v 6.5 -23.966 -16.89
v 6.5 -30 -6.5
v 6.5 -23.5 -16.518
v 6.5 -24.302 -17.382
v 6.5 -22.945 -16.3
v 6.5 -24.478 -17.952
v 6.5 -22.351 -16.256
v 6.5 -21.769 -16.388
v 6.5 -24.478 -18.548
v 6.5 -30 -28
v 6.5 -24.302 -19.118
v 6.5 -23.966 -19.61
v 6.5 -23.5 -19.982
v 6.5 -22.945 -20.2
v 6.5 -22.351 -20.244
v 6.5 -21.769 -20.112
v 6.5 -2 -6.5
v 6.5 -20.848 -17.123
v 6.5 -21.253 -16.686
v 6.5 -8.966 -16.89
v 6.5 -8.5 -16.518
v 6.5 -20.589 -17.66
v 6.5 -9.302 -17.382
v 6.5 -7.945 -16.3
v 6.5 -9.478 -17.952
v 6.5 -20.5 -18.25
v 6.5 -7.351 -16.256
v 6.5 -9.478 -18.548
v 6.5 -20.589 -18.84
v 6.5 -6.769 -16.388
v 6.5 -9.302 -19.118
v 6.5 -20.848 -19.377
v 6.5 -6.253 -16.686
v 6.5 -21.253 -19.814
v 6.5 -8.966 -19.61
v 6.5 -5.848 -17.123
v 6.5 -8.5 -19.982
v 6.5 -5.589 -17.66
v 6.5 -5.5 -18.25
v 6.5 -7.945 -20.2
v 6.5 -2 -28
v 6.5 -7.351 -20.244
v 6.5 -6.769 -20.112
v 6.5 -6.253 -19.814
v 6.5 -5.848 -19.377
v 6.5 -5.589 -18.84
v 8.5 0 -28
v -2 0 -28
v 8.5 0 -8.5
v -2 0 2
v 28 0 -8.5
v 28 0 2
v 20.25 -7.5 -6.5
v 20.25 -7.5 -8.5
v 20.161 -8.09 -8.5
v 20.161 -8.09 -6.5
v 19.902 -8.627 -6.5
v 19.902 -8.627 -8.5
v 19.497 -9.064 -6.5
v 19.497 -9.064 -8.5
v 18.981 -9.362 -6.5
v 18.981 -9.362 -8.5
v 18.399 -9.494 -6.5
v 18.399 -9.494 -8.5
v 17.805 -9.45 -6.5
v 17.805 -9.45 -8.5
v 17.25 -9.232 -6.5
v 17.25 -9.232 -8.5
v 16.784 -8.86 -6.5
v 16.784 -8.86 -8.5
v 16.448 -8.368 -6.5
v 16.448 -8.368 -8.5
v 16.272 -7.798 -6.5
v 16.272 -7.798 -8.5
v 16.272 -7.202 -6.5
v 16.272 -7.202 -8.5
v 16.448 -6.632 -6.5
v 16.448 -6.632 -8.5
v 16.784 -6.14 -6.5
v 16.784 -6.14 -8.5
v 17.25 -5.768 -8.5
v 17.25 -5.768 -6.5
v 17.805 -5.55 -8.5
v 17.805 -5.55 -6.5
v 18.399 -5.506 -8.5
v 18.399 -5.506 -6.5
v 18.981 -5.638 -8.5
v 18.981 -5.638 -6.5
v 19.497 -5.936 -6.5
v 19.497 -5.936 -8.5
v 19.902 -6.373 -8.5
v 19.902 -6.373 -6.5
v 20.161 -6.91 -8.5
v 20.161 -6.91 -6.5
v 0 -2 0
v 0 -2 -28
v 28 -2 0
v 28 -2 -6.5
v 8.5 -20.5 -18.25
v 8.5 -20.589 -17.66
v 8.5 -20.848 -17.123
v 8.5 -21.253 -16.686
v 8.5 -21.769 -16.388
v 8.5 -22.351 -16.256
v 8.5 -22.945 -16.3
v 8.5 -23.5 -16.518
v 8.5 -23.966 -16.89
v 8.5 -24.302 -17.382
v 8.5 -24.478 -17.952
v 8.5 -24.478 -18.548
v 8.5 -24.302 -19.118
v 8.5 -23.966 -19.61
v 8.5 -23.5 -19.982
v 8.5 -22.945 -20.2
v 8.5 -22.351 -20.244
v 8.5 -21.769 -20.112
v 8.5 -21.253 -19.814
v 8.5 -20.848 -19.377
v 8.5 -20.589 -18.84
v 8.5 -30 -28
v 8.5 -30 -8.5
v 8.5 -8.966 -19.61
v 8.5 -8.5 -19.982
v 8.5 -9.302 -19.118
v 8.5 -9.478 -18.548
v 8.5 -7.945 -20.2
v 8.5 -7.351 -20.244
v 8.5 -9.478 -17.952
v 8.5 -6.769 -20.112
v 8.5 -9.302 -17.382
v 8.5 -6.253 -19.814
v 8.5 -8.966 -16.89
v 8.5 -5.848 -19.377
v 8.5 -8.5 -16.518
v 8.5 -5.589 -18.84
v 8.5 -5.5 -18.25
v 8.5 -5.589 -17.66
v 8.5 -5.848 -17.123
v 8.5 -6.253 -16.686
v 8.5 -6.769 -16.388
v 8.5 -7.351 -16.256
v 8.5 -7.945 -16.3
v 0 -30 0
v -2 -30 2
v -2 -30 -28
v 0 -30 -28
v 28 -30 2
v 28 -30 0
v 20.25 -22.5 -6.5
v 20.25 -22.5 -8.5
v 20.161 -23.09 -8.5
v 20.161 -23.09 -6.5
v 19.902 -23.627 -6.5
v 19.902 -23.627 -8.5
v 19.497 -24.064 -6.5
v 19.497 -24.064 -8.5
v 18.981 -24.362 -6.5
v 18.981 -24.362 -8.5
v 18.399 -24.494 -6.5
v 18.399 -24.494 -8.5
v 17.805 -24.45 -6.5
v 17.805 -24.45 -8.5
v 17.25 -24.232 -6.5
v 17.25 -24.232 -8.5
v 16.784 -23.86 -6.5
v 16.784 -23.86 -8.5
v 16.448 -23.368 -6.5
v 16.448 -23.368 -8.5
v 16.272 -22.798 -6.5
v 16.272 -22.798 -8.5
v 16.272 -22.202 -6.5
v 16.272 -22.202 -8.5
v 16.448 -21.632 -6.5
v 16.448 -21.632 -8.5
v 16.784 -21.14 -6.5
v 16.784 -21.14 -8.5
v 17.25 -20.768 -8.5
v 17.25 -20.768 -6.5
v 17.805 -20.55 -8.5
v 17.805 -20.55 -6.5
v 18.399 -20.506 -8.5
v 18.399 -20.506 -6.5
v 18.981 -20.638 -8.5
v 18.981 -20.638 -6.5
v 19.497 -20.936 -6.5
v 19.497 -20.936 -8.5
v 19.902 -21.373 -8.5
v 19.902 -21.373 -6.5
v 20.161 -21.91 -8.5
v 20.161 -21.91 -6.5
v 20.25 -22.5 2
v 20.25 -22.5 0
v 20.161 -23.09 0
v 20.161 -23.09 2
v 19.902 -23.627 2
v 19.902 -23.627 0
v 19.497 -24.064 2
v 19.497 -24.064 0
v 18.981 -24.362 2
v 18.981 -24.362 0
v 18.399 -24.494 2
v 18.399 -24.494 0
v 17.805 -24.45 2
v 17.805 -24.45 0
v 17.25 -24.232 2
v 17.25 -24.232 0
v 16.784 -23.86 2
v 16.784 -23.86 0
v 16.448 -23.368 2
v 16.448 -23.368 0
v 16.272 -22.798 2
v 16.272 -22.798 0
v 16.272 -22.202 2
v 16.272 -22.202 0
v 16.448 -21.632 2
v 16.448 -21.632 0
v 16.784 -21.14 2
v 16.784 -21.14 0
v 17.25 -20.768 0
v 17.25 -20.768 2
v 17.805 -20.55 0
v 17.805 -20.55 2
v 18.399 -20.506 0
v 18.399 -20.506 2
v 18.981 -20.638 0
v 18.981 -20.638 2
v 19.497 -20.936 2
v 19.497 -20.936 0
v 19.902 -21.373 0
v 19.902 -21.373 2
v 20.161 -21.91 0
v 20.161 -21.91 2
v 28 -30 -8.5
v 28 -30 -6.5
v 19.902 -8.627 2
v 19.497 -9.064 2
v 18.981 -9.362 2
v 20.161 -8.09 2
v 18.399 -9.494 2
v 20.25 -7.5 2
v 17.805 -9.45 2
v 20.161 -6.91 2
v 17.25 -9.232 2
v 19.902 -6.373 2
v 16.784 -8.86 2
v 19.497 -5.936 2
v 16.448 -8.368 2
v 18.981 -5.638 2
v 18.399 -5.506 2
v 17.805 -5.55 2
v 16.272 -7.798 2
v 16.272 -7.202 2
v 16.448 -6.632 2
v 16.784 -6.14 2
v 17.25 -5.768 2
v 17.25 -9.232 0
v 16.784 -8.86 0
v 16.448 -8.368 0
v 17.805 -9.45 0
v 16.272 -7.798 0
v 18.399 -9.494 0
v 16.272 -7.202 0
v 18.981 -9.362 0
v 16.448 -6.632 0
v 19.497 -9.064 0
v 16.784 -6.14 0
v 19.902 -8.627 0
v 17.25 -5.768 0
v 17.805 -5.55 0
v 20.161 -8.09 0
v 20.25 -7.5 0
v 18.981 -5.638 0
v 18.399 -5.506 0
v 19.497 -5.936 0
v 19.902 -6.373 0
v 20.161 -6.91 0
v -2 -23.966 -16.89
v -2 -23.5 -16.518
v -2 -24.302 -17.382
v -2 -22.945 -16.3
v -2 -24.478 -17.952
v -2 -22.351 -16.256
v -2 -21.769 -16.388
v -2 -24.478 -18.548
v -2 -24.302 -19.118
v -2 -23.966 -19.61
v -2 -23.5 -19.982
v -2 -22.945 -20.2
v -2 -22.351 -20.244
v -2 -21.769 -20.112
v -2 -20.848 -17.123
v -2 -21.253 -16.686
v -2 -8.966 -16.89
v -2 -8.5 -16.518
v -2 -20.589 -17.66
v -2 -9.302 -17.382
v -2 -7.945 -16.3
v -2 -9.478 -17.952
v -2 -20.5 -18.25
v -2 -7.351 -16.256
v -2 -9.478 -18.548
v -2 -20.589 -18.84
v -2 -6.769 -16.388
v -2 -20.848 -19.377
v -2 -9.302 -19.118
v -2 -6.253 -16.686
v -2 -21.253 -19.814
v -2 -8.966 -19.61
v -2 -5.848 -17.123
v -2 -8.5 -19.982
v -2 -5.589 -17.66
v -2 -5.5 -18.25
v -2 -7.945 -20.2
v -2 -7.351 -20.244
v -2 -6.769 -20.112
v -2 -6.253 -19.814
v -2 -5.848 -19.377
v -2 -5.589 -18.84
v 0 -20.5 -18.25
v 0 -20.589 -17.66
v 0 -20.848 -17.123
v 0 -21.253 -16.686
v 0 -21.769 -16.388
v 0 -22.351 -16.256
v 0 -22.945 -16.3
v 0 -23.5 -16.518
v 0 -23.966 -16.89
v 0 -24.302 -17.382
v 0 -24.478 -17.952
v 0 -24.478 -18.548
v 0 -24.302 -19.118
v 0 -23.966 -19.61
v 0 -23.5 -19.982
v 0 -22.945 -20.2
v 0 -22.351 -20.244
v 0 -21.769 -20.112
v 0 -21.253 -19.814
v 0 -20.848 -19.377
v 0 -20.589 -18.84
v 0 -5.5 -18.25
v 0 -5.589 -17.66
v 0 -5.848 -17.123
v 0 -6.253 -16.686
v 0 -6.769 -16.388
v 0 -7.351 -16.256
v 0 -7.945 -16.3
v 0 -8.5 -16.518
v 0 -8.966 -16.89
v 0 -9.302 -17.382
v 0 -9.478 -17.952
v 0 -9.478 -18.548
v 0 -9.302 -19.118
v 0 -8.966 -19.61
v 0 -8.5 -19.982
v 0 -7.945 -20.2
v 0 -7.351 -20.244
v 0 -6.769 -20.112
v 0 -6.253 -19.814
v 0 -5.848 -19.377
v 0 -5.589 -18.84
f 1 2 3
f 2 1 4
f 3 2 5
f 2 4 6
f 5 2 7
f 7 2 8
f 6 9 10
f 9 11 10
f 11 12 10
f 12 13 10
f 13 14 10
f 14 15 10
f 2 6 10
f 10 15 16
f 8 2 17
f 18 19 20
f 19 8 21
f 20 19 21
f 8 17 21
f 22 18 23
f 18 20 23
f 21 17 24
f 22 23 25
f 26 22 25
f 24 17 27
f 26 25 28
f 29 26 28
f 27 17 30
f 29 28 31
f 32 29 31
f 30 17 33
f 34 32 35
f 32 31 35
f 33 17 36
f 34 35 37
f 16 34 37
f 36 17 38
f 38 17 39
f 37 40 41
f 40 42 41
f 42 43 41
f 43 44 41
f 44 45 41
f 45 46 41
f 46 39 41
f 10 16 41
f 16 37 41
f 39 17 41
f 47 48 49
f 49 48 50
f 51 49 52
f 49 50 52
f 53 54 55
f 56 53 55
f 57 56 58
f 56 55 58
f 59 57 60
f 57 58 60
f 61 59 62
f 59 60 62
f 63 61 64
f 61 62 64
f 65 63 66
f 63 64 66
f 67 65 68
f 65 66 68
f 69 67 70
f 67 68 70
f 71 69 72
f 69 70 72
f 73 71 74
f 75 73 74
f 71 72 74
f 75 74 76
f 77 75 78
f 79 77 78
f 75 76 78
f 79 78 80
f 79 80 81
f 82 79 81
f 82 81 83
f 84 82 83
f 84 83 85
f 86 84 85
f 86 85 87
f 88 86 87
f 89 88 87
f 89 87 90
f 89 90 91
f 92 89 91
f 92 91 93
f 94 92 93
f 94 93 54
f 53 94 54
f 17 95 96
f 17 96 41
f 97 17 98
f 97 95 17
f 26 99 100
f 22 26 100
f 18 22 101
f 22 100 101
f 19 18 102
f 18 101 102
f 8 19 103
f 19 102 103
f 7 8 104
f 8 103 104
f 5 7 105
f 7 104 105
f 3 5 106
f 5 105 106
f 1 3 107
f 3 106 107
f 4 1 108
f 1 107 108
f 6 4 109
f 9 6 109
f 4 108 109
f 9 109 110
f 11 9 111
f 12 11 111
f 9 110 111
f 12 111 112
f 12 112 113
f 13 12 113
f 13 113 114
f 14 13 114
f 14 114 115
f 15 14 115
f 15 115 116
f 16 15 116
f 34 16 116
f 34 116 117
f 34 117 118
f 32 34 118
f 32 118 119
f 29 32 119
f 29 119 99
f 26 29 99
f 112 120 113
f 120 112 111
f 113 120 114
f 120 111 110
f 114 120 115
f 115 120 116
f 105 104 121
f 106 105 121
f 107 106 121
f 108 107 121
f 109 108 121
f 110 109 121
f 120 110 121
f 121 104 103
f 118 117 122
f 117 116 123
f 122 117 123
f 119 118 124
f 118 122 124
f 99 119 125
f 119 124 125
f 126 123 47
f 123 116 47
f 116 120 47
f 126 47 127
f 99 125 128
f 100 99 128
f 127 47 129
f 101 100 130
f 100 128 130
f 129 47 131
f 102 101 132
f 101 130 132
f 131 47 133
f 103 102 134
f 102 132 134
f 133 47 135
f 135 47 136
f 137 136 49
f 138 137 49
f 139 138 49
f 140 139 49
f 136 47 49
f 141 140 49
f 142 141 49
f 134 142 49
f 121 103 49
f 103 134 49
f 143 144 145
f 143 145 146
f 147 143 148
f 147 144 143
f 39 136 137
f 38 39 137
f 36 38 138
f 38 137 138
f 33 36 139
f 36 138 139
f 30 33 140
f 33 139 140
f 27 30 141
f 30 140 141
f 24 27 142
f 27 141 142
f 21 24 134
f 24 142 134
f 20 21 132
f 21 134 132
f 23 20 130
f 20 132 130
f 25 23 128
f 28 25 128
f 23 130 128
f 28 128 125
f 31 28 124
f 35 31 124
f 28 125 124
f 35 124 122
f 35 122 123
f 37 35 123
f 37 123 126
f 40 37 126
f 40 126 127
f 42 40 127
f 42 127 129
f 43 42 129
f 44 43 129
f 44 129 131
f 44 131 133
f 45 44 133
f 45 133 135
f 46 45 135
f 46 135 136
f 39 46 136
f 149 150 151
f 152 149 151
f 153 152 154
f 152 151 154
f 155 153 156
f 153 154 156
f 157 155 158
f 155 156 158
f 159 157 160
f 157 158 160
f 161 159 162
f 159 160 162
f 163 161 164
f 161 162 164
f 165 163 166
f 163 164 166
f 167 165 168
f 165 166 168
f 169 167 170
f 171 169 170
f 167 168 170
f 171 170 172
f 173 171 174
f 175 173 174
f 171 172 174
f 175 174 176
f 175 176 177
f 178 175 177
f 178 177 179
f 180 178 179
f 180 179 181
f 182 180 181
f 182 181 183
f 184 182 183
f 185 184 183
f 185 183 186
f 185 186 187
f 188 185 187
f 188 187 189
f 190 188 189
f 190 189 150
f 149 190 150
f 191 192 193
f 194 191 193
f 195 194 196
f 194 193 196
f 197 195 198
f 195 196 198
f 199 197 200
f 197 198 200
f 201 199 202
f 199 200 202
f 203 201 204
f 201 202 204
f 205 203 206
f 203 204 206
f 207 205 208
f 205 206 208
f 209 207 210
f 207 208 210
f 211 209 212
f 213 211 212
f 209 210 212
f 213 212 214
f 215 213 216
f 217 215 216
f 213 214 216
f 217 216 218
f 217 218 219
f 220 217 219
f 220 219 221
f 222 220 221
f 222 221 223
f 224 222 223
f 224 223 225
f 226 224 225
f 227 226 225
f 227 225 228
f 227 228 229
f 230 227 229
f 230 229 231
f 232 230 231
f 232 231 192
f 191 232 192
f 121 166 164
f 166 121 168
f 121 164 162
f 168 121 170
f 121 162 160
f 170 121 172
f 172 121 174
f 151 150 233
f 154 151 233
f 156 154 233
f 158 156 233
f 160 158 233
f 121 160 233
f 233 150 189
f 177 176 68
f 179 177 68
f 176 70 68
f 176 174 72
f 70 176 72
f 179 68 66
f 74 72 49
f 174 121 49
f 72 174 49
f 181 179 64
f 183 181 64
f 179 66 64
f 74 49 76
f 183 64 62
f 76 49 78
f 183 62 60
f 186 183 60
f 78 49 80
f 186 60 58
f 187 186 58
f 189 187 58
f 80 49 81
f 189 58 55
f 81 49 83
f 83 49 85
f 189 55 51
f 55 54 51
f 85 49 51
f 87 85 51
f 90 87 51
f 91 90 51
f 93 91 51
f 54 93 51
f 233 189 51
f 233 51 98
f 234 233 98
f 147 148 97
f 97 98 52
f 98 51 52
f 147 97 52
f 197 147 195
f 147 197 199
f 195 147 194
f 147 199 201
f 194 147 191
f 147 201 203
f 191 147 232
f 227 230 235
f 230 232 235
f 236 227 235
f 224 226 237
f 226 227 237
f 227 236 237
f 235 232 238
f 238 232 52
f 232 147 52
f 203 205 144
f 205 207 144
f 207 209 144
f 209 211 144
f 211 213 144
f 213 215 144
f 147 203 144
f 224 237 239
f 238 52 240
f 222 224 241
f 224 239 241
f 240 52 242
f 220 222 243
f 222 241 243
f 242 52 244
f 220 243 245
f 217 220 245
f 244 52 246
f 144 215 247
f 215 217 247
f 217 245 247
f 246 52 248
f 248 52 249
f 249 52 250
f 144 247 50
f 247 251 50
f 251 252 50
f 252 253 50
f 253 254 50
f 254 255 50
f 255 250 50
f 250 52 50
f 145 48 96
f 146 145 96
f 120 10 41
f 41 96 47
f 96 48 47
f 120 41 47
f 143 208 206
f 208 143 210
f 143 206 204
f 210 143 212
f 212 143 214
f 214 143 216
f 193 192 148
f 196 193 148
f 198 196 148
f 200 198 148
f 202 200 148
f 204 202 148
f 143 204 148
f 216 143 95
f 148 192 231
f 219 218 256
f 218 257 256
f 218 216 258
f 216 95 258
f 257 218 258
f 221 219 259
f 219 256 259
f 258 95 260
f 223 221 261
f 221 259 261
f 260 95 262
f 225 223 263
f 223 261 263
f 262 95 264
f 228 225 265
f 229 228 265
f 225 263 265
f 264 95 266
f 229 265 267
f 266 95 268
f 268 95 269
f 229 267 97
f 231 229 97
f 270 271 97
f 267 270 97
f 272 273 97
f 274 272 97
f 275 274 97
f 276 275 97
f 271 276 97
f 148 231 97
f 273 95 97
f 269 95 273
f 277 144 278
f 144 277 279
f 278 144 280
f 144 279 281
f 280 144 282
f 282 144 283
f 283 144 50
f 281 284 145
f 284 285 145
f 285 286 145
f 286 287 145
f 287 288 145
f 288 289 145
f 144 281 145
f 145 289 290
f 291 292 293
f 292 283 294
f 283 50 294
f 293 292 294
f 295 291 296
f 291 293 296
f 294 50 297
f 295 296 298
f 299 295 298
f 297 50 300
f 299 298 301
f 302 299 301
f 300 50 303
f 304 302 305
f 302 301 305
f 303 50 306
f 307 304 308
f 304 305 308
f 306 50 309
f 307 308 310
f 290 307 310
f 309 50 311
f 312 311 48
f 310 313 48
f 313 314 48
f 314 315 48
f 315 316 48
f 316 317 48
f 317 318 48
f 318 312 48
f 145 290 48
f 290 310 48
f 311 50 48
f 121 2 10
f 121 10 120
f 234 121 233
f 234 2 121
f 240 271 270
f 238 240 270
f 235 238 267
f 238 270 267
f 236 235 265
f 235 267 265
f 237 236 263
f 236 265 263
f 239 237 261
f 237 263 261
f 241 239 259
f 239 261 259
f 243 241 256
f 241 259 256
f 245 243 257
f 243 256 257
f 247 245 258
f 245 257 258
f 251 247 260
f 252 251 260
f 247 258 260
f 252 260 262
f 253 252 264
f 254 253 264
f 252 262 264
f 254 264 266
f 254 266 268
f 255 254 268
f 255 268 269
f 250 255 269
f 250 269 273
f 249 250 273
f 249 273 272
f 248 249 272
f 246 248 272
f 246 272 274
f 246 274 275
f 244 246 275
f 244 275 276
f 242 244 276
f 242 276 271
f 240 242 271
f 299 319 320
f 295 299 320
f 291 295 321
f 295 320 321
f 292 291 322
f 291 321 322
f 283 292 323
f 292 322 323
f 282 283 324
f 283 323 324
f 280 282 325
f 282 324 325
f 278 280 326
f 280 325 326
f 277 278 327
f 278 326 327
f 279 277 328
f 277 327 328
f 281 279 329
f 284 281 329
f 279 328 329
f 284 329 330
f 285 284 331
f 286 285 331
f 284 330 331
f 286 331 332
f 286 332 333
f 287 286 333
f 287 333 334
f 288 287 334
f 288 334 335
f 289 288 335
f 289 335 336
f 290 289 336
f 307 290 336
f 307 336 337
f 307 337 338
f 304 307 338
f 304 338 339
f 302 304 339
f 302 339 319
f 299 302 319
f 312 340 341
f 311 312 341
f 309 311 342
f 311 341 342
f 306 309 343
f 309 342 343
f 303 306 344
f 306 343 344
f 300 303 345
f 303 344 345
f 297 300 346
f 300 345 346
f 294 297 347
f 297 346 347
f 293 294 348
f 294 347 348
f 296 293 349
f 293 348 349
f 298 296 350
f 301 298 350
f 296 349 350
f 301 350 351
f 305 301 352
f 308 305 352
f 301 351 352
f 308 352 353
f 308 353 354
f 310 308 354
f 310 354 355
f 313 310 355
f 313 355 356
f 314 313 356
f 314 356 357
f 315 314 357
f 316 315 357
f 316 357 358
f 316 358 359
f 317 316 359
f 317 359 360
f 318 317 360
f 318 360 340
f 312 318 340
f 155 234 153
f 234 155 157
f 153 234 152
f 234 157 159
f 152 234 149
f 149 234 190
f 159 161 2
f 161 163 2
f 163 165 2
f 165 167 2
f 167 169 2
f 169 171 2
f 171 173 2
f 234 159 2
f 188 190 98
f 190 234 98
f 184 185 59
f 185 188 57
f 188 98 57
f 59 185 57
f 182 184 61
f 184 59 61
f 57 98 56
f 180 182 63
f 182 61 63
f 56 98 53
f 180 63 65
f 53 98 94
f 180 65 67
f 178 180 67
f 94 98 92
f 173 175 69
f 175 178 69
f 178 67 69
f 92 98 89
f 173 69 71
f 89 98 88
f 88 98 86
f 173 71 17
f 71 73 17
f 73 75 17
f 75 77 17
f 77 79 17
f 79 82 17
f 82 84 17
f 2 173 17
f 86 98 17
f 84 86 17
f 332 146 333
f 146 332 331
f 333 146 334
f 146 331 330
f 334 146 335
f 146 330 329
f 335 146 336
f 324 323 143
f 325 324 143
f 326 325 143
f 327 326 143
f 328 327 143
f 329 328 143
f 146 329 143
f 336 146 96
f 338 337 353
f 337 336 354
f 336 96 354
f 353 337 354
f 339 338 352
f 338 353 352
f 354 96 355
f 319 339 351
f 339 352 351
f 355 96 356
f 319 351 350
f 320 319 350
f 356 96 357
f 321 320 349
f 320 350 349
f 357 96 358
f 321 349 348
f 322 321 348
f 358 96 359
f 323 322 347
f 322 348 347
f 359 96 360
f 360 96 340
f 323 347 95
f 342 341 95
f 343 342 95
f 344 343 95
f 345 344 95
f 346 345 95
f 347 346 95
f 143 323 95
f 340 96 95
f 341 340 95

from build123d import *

# Parameters (mm, degrees)
F2_W     = 28
F2_H     = 2
F2_W_2   = 2
F2_W_3   = 19.5
F2_H_2   = 19.5
F3_DEPTH = 2
F4_DEPTH = 30
F5_R     = 2
F6_DEPTH = 25
F7_R     = 2
F8_DEPTH = 25


with BuildPart() as f3:
    # F2 (on Front) → F3 (new body)
    with BuildSketch(Plane.XZ):
        with Locations((14, 1)):
            Rectangle(F2_W, F2_H)
        Polygon((28, 0), (0, 0), (0, -6.5), (6.5, -6.5), (8.5, -6.5), (28, -6.5), align=None)
        with Locations((-1, 1)):
            Rectangle(F2_W_2, F2_H)
        Polygon((0, -6.5), (0, 0), (-2, 0), (-2, -28), (0, -28), align=None)
        Polygon((6.5, -6.5), (0, -6.5), (0, -28), (6.5, -28), (6.5, -8.5), align=None)
        with Locations((18.25, -7.5)):
            Rectangle(F2_W_3, F2_H)
        with Locations((7.5, -7.5)):
            Rectangle(F2_W_2, F2_H)
        with Locations((7.5, -18.25)):
            Rectangle(F2_W_2, F2_H_2)
    extrude(amount=F3_DEPTH)

    # F2 (on Front) → F4 (join)
    with BuildSketch(Plane.XZ):
        with Locations((14, 1)):
            Rectangle(F2_W, F2_H)
        with Locations((-1, 1)):
            Rectangle(F2_W_2, F2_H)
        Polygon((0, -6.5), (0, 0), (-2, 0), (-2, -28), (0, -28), align=None)
        with Locations((18.25, -7.5)):
            Rectangle(F2_W_3, F2_H)
        with Locations((7.5, -7.5)):
            Rectangle(F2_W_2, F2_H)
        with Locations((7.5, -18.25)):
            Rectangle(F2_W_2, F2_H_2)
    extrude(amount=F4_DEPTH)

    # F5 (on face) → F6 (cut)
    with BuildSketch(Plane(origin=(0, 0, -8.5), x_dir=(1, 0, 0), z_dir=(0, 0, -1))):
        with Locations((18.25, 22.5)):
            Circle(F5_R)
        with Locations((18.25, 7.5)):
            Circle(F5_R)
    extrude(amount=-F6_DEPTH, mode=Mode.SUBTRACT)

    # F7 (on face) → F8 (cut)
    with BuildSketch(Plane.YZ.offset(8.5)):
        with Locations((-22.5, -18.25)):
            Circle(F7_R)
        with Locations((-7.5, -18.25)):
            Circle(F7_R)
    extrude(amount=-F8_DEPTH, mode=Mode.SUBTRACT)


solid = f3.part
